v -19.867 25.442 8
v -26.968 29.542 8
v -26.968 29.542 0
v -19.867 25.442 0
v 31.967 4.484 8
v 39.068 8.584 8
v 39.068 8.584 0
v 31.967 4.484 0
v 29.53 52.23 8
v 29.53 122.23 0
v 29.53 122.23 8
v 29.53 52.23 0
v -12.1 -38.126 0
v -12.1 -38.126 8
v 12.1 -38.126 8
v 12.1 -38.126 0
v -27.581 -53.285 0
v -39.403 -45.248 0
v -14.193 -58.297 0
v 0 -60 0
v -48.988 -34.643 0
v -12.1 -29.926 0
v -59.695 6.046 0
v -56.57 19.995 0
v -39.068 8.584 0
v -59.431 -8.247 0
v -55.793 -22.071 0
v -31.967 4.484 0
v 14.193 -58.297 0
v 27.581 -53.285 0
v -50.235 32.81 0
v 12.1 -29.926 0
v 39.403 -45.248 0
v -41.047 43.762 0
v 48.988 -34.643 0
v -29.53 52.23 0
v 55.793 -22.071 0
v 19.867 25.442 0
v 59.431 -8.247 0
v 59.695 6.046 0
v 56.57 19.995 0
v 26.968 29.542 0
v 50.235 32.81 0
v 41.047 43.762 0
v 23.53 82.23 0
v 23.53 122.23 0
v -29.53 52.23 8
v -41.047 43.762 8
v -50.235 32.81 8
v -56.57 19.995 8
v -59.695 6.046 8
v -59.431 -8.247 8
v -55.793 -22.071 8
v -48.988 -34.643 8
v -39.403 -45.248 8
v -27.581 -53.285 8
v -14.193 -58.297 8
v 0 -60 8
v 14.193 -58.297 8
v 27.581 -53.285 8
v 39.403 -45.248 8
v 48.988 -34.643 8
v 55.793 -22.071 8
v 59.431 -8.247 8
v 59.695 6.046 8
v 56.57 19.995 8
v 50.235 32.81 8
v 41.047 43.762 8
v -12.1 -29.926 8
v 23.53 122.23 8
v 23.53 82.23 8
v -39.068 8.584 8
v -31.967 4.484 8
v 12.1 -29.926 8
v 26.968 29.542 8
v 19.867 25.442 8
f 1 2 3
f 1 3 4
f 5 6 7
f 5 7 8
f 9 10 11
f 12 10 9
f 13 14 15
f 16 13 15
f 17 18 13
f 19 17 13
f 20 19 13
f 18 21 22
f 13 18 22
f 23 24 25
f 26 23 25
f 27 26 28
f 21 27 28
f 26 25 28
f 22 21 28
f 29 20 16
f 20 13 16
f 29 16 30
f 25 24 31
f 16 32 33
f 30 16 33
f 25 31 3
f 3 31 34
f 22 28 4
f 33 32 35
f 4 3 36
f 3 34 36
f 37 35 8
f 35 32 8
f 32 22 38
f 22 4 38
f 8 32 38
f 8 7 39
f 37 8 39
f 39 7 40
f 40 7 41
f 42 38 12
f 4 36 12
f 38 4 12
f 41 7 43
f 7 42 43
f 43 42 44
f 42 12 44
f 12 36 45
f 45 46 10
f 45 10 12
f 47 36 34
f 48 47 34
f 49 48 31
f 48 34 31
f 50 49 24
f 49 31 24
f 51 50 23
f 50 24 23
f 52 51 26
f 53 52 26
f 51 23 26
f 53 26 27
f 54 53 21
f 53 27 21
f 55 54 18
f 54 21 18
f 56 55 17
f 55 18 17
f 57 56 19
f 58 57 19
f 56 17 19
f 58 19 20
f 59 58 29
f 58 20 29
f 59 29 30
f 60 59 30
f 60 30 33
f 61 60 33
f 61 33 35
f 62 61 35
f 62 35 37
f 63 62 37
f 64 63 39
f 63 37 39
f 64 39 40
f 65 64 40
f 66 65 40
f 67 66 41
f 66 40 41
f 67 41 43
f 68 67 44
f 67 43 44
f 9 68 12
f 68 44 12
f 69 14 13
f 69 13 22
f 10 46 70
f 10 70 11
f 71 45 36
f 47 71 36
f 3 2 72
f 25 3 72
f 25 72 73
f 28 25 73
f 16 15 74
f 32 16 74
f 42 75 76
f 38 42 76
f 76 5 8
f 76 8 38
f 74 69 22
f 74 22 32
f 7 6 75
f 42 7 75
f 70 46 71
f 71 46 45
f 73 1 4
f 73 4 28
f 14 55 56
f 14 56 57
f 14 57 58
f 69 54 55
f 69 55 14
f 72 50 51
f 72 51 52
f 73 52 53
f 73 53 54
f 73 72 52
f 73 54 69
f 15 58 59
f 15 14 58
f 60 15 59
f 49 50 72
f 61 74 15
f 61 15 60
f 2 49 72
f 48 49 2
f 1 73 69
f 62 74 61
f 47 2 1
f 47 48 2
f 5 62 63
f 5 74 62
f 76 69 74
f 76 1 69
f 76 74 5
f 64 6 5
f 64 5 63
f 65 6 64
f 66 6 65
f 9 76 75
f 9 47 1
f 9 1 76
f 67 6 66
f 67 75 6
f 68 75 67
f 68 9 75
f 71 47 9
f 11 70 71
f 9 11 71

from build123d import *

# Parameters (mm, degrees)
PAD_DEPTH          = 8
SKETCH001_W        = 24.2
SKETCH001_H        = 8.2
POCKET_DEPTH       = 8
POLARPATTERN_COUNT = 3


with BuildPart() as part:
    # Sketch → Pad (new body)
    with BuildSketch(Plane.XY):
        with BuildLine():
            ThreePointArc((-29.53026, 52.229912), (0, -60), (29.53026, 52.229912))
            Line((29.53026, 122.229912), (29.53026, 52.229912))
            Line((23.53026, 122.229912), (29.53026, 122.229912))
            Line((23.53026, 122.229912), (23.53026, 82.229912))
            Line((23.53026, 82.229912), (-29.53026, 52.229912))
        make_face()
    extrude(amount=PAD_DEPTH)

    # Sketch001 → Pocket (cut)
    with BuildSketch(Plane.XY.offset(8)):
        with Locations((0, -34.025975)):
            Rectangle(SKETCH001_W, SKETCH001_H)
    pocket = extrude(amount=-POCKET_DEPTH, mode=Mode.SUBTRACT)

    # PolarPattern: Pocket ×3 about axis
    polarpattern_axis = Axis((0, 0, 8), (0, 0, 1))
    for i in range(1, POLARPATTERN_COUNT):
        add(pocket.rotate(polarpattern_axis, i * 360 / POLARPATTERN_COUNT), mode=Mode.SUBTRACT)


solid = part.part
